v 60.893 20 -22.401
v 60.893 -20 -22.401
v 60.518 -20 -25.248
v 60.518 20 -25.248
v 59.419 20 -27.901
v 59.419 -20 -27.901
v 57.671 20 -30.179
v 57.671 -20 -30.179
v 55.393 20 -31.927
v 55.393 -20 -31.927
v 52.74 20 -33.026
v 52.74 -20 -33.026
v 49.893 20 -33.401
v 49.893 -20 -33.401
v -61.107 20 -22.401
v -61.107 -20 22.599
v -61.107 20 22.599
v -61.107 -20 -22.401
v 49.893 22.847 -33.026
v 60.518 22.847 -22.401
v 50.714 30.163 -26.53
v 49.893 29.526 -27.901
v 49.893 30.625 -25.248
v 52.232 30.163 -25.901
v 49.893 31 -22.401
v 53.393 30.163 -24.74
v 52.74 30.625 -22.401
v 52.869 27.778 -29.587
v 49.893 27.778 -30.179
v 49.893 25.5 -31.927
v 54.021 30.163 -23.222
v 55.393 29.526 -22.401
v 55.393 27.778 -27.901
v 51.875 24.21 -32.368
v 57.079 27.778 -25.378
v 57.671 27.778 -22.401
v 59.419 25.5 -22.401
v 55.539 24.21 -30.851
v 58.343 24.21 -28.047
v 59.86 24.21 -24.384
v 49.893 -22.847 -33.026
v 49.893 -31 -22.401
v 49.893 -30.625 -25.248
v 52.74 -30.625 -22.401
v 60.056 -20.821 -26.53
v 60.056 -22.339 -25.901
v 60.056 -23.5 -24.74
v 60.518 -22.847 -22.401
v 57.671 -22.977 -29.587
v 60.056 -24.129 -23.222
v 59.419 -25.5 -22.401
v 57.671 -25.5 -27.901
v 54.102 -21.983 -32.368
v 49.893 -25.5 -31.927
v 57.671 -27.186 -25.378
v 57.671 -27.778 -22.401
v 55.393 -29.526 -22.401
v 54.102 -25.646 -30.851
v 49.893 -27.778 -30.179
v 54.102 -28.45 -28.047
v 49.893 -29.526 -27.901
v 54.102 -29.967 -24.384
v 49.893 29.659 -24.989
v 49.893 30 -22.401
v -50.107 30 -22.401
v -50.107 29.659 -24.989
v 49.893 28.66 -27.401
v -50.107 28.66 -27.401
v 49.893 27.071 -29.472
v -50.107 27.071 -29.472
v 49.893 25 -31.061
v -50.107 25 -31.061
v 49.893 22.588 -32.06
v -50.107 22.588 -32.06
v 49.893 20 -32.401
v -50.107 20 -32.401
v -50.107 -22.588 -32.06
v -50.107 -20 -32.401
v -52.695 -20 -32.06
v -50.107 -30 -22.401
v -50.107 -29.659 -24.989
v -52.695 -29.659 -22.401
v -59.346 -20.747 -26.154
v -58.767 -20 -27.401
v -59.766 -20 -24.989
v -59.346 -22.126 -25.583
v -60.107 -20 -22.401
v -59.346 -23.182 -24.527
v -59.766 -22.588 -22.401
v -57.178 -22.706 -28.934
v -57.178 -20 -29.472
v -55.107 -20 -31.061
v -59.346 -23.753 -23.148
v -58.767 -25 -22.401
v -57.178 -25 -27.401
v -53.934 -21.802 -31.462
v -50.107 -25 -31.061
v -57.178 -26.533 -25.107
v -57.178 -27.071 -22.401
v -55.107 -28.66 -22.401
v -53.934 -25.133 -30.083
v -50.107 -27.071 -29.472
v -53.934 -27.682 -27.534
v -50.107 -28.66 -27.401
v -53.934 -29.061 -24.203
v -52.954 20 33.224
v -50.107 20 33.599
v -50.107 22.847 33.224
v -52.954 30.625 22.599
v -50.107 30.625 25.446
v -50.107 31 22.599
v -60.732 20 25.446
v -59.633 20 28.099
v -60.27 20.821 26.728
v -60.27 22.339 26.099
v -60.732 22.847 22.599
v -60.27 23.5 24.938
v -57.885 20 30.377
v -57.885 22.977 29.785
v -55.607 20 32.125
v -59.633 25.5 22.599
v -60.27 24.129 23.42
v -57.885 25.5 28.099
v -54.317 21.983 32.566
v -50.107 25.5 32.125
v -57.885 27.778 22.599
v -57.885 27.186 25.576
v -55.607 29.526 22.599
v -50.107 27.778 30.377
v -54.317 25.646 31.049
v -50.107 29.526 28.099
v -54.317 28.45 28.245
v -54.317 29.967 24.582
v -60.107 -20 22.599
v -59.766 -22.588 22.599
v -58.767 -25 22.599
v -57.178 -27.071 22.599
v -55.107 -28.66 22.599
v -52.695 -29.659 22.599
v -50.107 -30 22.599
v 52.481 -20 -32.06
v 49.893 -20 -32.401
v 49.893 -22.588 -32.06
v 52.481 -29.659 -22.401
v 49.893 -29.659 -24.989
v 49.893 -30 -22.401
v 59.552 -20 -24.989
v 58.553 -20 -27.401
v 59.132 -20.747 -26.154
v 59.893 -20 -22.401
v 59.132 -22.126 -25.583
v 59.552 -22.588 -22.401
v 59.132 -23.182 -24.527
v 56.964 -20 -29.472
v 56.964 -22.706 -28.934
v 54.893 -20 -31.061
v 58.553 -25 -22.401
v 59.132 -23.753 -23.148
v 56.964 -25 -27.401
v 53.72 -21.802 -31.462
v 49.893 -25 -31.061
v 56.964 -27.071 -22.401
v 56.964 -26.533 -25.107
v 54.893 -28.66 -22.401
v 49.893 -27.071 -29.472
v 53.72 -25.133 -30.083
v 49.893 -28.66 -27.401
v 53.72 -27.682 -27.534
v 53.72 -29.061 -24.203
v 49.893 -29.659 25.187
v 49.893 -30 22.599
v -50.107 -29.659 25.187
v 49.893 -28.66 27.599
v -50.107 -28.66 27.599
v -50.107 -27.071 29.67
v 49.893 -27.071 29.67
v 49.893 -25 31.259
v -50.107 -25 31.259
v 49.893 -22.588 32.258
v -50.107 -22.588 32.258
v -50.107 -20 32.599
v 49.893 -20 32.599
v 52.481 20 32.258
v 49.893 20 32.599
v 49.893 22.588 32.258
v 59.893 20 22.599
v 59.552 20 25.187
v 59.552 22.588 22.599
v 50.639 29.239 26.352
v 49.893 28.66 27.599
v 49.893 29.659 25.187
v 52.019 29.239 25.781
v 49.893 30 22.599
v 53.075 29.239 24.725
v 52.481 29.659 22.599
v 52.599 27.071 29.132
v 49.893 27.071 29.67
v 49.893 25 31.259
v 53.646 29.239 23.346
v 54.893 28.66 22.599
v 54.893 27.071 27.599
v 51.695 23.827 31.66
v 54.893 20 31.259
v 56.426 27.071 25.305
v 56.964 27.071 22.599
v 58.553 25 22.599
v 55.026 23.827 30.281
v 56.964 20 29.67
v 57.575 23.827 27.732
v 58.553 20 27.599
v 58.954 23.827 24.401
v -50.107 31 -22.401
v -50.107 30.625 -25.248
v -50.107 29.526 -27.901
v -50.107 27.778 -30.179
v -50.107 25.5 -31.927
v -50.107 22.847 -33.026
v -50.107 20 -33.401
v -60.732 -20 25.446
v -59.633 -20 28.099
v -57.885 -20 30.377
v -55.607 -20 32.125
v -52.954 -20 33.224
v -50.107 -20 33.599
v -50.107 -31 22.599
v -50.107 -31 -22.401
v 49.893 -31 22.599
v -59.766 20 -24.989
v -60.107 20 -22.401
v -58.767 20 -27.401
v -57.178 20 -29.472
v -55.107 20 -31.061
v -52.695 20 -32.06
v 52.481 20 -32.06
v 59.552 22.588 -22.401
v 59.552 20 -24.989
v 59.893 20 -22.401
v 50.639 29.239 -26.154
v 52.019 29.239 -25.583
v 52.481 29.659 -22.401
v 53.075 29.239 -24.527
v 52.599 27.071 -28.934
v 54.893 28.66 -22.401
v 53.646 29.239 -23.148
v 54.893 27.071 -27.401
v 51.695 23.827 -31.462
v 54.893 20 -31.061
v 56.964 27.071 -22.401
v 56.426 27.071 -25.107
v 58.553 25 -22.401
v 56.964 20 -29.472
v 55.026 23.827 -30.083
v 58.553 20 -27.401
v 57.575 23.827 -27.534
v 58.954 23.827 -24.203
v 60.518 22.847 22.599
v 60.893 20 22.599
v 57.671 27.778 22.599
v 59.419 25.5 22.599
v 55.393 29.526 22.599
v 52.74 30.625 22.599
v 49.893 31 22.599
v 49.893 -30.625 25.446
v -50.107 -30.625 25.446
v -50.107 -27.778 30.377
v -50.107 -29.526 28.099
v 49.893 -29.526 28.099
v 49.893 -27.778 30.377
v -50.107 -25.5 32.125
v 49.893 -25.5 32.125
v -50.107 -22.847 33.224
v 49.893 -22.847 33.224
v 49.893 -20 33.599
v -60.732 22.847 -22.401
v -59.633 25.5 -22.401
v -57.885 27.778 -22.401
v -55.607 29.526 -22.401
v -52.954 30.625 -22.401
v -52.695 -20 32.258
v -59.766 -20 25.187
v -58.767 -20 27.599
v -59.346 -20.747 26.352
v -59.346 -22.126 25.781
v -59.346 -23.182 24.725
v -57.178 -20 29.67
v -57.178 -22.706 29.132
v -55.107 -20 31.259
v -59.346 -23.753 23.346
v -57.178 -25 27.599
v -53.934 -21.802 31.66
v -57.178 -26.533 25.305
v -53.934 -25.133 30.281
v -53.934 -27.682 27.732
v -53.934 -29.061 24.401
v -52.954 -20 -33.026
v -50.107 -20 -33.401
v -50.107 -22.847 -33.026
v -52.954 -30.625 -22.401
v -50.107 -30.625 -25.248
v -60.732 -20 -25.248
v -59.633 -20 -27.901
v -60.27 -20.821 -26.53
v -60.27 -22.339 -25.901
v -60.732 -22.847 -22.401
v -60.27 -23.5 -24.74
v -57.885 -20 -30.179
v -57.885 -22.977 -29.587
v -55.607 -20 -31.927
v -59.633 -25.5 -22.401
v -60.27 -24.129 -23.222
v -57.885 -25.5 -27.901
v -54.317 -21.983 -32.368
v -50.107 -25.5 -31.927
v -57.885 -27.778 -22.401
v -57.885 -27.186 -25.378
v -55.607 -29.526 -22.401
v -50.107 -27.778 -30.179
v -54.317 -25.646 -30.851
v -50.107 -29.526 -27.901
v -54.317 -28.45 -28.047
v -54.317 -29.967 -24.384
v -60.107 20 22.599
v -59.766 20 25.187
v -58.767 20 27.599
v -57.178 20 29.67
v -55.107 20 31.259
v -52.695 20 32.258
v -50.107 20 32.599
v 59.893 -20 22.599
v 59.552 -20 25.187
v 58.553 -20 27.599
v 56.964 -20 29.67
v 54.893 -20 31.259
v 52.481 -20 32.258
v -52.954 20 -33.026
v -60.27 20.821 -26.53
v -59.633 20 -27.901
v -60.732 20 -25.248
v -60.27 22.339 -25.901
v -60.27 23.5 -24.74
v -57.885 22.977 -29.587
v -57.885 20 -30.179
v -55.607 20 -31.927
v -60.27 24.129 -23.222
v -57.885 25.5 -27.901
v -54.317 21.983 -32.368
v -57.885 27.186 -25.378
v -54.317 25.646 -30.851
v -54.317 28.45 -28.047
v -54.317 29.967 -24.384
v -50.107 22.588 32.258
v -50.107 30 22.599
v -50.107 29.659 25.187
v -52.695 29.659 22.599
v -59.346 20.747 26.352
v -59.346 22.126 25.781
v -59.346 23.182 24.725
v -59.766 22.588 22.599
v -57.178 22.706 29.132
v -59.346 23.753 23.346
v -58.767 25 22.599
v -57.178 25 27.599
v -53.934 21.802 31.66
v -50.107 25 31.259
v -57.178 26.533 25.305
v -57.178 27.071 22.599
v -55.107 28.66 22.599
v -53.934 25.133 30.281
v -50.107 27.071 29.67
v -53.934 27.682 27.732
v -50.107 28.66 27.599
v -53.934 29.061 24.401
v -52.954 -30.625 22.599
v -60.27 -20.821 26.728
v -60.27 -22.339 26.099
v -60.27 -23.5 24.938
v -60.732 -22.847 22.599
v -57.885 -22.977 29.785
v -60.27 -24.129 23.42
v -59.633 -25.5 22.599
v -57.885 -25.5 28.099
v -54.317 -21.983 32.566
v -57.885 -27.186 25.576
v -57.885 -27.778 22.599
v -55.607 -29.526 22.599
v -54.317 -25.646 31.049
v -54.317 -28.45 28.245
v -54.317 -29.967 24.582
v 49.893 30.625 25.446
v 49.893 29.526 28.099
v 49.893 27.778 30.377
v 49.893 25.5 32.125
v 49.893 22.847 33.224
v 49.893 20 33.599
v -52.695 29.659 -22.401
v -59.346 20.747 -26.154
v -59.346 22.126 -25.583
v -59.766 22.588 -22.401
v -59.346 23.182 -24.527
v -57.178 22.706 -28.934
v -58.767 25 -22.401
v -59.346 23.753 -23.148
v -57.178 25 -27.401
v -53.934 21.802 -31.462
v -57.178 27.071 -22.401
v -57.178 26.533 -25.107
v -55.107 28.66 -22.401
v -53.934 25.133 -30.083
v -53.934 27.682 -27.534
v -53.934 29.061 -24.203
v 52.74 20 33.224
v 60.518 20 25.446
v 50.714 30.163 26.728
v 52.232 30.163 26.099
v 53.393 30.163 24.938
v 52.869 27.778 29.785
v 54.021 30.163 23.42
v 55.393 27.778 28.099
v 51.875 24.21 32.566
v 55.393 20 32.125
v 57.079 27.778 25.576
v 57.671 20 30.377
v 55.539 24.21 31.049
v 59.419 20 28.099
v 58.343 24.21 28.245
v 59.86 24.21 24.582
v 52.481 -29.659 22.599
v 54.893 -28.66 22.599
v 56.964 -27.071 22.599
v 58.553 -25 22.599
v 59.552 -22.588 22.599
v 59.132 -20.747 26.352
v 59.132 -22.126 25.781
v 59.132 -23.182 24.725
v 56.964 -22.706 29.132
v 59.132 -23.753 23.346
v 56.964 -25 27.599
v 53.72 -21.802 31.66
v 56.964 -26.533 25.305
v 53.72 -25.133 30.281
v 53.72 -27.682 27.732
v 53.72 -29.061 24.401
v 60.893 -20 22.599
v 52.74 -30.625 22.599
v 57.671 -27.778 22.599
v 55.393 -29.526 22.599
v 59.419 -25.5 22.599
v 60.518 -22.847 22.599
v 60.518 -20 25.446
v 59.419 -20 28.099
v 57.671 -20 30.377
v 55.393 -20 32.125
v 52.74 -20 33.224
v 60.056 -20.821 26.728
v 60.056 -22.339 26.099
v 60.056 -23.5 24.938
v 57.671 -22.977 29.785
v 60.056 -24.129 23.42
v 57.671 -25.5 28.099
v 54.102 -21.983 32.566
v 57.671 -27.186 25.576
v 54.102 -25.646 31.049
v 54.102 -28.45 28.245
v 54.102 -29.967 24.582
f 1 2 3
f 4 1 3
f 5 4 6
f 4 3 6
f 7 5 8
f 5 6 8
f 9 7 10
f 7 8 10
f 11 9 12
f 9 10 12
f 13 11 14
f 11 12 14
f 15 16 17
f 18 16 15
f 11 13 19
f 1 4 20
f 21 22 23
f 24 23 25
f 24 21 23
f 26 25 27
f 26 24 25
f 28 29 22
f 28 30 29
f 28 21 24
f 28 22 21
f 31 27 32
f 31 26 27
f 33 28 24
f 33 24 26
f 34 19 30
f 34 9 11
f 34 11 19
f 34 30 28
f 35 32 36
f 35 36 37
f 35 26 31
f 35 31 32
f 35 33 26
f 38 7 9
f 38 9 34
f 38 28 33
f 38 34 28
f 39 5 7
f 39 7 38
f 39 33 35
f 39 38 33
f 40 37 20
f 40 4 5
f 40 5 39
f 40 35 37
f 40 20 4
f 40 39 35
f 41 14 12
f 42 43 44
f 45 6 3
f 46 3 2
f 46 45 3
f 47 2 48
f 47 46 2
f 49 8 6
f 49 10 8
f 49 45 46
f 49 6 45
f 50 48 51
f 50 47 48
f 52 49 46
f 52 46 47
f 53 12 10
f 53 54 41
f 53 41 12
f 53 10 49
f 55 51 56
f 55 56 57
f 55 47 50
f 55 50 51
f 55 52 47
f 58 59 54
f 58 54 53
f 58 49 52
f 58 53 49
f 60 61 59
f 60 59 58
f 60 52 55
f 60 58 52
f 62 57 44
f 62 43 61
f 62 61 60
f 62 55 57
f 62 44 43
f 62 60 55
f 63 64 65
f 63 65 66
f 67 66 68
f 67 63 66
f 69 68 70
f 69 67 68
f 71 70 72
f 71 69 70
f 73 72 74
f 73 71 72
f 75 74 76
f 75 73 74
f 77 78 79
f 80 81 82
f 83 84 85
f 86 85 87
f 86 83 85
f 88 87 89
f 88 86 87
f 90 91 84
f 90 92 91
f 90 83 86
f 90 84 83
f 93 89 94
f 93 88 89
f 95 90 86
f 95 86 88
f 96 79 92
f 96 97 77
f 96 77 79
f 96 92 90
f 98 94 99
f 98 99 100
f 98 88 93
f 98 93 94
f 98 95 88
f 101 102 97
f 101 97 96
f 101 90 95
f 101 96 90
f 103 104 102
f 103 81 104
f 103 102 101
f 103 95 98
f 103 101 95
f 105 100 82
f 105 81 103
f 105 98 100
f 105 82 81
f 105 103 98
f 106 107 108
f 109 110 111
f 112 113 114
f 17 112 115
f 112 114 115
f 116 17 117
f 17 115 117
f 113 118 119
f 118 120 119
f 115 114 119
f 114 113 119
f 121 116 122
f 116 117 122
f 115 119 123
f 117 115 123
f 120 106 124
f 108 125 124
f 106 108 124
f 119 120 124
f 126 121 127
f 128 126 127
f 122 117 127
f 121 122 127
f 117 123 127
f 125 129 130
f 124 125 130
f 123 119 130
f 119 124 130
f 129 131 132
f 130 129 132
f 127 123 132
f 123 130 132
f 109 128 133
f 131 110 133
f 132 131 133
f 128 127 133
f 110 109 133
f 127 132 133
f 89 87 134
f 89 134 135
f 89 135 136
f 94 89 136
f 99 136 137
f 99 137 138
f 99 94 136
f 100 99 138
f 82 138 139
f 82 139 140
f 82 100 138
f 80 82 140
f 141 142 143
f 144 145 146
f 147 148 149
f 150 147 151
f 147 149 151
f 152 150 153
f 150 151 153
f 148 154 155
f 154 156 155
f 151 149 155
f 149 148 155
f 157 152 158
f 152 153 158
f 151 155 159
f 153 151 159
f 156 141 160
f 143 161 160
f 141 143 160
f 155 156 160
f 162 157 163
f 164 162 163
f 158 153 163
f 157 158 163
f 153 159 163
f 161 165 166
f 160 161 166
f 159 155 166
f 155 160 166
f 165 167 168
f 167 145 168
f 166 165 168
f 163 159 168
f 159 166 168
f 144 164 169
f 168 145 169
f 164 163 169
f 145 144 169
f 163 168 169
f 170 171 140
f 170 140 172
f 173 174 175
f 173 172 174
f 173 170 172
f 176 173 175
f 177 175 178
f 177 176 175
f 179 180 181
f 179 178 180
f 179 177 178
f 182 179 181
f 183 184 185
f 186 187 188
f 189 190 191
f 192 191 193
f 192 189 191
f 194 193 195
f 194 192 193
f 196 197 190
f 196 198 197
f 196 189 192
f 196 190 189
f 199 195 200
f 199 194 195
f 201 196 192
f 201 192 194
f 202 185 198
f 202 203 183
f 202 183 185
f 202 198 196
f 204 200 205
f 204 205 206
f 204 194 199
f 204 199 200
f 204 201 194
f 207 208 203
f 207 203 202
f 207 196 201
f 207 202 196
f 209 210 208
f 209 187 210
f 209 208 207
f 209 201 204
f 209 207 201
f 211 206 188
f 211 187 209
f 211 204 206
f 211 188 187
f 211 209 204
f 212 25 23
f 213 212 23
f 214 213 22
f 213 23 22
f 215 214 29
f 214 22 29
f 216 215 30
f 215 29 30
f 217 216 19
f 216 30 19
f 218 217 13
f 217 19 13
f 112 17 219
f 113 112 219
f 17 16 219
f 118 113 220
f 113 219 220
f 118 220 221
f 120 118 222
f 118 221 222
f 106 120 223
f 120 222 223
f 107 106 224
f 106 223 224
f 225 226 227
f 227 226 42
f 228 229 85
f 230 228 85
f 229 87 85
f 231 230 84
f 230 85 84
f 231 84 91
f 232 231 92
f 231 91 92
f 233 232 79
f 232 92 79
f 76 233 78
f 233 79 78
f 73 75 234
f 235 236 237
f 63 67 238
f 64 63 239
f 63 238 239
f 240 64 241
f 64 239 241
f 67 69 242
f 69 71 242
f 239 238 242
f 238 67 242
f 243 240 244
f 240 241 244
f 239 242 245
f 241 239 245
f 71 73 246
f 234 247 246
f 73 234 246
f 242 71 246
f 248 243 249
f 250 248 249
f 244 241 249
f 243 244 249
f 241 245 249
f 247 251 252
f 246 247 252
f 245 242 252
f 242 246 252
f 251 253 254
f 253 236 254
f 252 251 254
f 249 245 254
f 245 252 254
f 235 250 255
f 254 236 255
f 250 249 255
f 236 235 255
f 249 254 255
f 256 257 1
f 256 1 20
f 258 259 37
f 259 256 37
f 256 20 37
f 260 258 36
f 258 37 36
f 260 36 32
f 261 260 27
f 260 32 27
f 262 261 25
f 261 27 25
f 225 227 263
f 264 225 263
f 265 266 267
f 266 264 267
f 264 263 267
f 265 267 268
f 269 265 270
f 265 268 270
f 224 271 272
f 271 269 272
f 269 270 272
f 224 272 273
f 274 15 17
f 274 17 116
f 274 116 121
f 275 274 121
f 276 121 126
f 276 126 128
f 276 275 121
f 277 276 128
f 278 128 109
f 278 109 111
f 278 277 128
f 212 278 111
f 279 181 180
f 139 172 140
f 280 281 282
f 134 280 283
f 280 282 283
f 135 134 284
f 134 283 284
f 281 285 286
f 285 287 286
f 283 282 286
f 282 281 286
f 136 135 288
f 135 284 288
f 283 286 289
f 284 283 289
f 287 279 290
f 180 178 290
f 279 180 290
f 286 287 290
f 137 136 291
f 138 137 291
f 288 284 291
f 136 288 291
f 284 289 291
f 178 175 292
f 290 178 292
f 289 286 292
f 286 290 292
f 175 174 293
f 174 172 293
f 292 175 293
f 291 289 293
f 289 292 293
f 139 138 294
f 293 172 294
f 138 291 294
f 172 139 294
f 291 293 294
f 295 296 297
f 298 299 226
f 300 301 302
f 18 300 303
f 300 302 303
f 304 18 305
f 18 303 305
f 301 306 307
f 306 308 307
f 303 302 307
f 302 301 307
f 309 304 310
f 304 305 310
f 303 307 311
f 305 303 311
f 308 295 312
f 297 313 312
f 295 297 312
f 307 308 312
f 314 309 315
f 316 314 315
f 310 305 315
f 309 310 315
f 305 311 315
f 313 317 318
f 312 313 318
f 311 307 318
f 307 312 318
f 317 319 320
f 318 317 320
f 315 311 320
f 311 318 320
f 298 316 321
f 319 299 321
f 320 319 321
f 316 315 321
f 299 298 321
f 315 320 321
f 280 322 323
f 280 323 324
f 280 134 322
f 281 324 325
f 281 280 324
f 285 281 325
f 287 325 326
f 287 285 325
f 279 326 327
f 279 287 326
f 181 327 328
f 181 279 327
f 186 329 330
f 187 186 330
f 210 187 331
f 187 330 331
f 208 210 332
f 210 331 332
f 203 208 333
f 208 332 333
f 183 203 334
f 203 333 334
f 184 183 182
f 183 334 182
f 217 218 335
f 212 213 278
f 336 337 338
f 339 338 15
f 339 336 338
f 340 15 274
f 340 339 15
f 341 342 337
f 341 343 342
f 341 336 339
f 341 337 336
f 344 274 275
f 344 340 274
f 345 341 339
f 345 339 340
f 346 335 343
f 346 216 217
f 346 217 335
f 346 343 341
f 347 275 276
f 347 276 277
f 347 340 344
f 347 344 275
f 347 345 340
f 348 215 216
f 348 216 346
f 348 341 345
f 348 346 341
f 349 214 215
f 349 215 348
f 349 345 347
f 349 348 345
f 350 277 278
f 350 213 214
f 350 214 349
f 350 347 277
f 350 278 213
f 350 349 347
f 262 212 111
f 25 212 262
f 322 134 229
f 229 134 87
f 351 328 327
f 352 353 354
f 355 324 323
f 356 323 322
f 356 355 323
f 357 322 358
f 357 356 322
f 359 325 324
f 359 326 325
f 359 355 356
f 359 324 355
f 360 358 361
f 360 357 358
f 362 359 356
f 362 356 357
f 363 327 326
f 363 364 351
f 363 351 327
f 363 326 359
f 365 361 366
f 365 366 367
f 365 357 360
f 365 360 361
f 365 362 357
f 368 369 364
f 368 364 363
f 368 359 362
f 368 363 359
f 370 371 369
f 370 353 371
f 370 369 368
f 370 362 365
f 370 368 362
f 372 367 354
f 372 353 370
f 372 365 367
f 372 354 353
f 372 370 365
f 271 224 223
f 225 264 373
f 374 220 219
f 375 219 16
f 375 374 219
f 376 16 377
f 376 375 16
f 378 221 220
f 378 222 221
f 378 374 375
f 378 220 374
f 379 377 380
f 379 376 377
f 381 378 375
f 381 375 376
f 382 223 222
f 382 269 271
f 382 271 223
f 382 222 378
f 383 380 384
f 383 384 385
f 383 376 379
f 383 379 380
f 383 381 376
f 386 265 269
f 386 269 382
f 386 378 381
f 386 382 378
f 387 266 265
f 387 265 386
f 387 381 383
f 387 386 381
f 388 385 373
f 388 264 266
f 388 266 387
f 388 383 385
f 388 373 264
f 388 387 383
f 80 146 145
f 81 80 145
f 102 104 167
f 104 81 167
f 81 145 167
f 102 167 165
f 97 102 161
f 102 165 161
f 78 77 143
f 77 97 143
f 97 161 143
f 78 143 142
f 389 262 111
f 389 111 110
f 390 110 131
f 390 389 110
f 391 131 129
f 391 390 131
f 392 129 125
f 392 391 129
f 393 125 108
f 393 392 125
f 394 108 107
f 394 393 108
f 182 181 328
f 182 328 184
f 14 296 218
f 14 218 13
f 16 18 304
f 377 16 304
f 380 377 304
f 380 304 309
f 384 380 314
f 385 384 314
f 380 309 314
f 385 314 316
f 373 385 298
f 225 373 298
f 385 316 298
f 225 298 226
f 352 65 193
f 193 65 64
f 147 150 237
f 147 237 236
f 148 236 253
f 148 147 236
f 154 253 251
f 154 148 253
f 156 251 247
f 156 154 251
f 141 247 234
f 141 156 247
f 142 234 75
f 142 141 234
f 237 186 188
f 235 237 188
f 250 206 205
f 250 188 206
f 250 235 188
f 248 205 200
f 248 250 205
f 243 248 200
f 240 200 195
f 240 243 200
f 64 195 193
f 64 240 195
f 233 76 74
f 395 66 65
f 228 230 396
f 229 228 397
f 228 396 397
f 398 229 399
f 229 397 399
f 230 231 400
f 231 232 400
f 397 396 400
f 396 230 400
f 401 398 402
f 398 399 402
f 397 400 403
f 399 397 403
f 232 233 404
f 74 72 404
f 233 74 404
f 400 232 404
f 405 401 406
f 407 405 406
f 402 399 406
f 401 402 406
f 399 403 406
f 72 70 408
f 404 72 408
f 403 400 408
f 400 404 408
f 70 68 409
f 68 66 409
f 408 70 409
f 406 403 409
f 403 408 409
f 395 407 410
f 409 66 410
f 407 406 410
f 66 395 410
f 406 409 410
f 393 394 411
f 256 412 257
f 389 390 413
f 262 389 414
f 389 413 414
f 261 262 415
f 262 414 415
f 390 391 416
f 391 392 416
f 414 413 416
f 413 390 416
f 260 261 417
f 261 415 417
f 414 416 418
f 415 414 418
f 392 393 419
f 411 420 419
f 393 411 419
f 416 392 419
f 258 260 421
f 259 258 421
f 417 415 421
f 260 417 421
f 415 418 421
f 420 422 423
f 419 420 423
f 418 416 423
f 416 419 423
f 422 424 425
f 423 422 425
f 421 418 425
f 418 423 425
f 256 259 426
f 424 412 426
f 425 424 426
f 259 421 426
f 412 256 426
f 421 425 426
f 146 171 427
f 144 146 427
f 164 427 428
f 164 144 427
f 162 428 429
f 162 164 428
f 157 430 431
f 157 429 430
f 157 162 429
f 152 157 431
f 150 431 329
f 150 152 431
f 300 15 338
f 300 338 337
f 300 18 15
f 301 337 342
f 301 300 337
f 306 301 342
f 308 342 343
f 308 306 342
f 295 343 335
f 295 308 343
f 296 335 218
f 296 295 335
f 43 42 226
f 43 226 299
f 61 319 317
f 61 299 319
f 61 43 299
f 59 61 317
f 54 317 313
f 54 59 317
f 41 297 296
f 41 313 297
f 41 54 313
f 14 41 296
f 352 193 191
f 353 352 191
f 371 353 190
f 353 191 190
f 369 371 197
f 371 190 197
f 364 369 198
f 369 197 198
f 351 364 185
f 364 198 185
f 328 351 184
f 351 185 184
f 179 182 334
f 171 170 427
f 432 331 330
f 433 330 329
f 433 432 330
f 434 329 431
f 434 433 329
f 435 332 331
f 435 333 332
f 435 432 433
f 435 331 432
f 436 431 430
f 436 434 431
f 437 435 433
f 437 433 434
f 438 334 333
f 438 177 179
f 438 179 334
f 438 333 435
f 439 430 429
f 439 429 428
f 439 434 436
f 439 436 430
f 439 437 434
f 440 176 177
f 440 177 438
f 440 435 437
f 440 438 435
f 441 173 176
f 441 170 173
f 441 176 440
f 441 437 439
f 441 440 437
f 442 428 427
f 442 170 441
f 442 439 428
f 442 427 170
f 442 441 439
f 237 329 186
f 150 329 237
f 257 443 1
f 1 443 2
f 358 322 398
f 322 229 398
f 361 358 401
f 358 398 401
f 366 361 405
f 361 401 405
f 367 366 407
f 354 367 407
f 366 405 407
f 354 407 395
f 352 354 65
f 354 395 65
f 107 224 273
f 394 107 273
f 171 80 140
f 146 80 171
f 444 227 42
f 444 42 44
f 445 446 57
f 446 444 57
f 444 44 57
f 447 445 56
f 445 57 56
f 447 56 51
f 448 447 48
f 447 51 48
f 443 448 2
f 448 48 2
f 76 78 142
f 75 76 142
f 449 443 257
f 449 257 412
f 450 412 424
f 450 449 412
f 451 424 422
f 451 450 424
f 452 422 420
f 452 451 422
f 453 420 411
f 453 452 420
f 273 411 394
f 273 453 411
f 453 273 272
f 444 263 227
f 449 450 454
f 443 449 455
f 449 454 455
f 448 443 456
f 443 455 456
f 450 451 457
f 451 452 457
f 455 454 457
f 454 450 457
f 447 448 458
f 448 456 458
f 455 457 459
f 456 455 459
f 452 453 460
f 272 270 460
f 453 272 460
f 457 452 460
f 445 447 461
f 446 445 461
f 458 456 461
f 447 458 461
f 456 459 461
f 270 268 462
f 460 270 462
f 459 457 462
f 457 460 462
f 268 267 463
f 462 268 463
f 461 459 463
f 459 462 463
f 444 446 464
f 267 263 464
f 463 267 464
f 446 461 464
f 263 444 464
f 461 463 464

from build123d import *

# Parameters (mm, degrees)
F0_W     = 120
F0_H     = 65
F1_DEPTH = 30
F2_R     = 10
F3_W     = 158.2465842366
F3_H     = 88.3002289823
F4_DEPTH = 60
F5_T     = 1


with BuildPart() as f1:
    # F0 (on Front) → F1 (new body, symmetric)
    with BuildSketch(Plane.XZ):
        with Locations((-0.1071500592, 0.0989875504)):
            Rectangle(F0_W, F0_H)
    extrude(amount=F1_DEPTH, both=True)

    # F2
    f2_edges = [f1.edges().sort_by_distance(p)[0] for p in [
        (-0.10715, -30, -32.401012),
        (59.89285, 0, -32.401012),
        (-0.10715, 30, -32.401012),
        (-60.10715, 0, -32.401012),
        (-0.10715, -30, 32.598988),
        (59.89285, 0, 32.598988),
        (-60.10715, 0, 32.598988),
        (-0.10715, 30, 32.598988),
        (-60.10715, 30, 0.098988),
        (-60.10715, -30, 0.098988),
        (59.89285, -30, 0.098988),
        (59.89285, 30, 0.098988),
    ]]
    fillet(f2_edges, radius=F2_R)

    # F3 (on face) → F4 (cut)
    with BuildSketch(Plane.XZ.offset(30)):
        with Locations((1.5532188118, 44.2491020416)):
            Rectangle(F3_W, F3_H)
    extrude(amount=-F4_DEPTH, mode=Mode.SUBTRACT)

    # F5
    f5_openings = [f1.faces().sort_by_distance(p)[0] for p in [
        (-0.10715, 0, 0.098988),
    ]]
    offset(amount=F5_T, openings=f5_openings)

    # F6: F1 across face


with BuildPart() as f1_1:
    add(f1.part)
    add(f1.part.mirror(Plane(origin=(-0.1071500592, 0, 0.0989875504), x_dir=(1, 0, 0), z_dir=(0, 0, 1))))


solid = f1_1.part
